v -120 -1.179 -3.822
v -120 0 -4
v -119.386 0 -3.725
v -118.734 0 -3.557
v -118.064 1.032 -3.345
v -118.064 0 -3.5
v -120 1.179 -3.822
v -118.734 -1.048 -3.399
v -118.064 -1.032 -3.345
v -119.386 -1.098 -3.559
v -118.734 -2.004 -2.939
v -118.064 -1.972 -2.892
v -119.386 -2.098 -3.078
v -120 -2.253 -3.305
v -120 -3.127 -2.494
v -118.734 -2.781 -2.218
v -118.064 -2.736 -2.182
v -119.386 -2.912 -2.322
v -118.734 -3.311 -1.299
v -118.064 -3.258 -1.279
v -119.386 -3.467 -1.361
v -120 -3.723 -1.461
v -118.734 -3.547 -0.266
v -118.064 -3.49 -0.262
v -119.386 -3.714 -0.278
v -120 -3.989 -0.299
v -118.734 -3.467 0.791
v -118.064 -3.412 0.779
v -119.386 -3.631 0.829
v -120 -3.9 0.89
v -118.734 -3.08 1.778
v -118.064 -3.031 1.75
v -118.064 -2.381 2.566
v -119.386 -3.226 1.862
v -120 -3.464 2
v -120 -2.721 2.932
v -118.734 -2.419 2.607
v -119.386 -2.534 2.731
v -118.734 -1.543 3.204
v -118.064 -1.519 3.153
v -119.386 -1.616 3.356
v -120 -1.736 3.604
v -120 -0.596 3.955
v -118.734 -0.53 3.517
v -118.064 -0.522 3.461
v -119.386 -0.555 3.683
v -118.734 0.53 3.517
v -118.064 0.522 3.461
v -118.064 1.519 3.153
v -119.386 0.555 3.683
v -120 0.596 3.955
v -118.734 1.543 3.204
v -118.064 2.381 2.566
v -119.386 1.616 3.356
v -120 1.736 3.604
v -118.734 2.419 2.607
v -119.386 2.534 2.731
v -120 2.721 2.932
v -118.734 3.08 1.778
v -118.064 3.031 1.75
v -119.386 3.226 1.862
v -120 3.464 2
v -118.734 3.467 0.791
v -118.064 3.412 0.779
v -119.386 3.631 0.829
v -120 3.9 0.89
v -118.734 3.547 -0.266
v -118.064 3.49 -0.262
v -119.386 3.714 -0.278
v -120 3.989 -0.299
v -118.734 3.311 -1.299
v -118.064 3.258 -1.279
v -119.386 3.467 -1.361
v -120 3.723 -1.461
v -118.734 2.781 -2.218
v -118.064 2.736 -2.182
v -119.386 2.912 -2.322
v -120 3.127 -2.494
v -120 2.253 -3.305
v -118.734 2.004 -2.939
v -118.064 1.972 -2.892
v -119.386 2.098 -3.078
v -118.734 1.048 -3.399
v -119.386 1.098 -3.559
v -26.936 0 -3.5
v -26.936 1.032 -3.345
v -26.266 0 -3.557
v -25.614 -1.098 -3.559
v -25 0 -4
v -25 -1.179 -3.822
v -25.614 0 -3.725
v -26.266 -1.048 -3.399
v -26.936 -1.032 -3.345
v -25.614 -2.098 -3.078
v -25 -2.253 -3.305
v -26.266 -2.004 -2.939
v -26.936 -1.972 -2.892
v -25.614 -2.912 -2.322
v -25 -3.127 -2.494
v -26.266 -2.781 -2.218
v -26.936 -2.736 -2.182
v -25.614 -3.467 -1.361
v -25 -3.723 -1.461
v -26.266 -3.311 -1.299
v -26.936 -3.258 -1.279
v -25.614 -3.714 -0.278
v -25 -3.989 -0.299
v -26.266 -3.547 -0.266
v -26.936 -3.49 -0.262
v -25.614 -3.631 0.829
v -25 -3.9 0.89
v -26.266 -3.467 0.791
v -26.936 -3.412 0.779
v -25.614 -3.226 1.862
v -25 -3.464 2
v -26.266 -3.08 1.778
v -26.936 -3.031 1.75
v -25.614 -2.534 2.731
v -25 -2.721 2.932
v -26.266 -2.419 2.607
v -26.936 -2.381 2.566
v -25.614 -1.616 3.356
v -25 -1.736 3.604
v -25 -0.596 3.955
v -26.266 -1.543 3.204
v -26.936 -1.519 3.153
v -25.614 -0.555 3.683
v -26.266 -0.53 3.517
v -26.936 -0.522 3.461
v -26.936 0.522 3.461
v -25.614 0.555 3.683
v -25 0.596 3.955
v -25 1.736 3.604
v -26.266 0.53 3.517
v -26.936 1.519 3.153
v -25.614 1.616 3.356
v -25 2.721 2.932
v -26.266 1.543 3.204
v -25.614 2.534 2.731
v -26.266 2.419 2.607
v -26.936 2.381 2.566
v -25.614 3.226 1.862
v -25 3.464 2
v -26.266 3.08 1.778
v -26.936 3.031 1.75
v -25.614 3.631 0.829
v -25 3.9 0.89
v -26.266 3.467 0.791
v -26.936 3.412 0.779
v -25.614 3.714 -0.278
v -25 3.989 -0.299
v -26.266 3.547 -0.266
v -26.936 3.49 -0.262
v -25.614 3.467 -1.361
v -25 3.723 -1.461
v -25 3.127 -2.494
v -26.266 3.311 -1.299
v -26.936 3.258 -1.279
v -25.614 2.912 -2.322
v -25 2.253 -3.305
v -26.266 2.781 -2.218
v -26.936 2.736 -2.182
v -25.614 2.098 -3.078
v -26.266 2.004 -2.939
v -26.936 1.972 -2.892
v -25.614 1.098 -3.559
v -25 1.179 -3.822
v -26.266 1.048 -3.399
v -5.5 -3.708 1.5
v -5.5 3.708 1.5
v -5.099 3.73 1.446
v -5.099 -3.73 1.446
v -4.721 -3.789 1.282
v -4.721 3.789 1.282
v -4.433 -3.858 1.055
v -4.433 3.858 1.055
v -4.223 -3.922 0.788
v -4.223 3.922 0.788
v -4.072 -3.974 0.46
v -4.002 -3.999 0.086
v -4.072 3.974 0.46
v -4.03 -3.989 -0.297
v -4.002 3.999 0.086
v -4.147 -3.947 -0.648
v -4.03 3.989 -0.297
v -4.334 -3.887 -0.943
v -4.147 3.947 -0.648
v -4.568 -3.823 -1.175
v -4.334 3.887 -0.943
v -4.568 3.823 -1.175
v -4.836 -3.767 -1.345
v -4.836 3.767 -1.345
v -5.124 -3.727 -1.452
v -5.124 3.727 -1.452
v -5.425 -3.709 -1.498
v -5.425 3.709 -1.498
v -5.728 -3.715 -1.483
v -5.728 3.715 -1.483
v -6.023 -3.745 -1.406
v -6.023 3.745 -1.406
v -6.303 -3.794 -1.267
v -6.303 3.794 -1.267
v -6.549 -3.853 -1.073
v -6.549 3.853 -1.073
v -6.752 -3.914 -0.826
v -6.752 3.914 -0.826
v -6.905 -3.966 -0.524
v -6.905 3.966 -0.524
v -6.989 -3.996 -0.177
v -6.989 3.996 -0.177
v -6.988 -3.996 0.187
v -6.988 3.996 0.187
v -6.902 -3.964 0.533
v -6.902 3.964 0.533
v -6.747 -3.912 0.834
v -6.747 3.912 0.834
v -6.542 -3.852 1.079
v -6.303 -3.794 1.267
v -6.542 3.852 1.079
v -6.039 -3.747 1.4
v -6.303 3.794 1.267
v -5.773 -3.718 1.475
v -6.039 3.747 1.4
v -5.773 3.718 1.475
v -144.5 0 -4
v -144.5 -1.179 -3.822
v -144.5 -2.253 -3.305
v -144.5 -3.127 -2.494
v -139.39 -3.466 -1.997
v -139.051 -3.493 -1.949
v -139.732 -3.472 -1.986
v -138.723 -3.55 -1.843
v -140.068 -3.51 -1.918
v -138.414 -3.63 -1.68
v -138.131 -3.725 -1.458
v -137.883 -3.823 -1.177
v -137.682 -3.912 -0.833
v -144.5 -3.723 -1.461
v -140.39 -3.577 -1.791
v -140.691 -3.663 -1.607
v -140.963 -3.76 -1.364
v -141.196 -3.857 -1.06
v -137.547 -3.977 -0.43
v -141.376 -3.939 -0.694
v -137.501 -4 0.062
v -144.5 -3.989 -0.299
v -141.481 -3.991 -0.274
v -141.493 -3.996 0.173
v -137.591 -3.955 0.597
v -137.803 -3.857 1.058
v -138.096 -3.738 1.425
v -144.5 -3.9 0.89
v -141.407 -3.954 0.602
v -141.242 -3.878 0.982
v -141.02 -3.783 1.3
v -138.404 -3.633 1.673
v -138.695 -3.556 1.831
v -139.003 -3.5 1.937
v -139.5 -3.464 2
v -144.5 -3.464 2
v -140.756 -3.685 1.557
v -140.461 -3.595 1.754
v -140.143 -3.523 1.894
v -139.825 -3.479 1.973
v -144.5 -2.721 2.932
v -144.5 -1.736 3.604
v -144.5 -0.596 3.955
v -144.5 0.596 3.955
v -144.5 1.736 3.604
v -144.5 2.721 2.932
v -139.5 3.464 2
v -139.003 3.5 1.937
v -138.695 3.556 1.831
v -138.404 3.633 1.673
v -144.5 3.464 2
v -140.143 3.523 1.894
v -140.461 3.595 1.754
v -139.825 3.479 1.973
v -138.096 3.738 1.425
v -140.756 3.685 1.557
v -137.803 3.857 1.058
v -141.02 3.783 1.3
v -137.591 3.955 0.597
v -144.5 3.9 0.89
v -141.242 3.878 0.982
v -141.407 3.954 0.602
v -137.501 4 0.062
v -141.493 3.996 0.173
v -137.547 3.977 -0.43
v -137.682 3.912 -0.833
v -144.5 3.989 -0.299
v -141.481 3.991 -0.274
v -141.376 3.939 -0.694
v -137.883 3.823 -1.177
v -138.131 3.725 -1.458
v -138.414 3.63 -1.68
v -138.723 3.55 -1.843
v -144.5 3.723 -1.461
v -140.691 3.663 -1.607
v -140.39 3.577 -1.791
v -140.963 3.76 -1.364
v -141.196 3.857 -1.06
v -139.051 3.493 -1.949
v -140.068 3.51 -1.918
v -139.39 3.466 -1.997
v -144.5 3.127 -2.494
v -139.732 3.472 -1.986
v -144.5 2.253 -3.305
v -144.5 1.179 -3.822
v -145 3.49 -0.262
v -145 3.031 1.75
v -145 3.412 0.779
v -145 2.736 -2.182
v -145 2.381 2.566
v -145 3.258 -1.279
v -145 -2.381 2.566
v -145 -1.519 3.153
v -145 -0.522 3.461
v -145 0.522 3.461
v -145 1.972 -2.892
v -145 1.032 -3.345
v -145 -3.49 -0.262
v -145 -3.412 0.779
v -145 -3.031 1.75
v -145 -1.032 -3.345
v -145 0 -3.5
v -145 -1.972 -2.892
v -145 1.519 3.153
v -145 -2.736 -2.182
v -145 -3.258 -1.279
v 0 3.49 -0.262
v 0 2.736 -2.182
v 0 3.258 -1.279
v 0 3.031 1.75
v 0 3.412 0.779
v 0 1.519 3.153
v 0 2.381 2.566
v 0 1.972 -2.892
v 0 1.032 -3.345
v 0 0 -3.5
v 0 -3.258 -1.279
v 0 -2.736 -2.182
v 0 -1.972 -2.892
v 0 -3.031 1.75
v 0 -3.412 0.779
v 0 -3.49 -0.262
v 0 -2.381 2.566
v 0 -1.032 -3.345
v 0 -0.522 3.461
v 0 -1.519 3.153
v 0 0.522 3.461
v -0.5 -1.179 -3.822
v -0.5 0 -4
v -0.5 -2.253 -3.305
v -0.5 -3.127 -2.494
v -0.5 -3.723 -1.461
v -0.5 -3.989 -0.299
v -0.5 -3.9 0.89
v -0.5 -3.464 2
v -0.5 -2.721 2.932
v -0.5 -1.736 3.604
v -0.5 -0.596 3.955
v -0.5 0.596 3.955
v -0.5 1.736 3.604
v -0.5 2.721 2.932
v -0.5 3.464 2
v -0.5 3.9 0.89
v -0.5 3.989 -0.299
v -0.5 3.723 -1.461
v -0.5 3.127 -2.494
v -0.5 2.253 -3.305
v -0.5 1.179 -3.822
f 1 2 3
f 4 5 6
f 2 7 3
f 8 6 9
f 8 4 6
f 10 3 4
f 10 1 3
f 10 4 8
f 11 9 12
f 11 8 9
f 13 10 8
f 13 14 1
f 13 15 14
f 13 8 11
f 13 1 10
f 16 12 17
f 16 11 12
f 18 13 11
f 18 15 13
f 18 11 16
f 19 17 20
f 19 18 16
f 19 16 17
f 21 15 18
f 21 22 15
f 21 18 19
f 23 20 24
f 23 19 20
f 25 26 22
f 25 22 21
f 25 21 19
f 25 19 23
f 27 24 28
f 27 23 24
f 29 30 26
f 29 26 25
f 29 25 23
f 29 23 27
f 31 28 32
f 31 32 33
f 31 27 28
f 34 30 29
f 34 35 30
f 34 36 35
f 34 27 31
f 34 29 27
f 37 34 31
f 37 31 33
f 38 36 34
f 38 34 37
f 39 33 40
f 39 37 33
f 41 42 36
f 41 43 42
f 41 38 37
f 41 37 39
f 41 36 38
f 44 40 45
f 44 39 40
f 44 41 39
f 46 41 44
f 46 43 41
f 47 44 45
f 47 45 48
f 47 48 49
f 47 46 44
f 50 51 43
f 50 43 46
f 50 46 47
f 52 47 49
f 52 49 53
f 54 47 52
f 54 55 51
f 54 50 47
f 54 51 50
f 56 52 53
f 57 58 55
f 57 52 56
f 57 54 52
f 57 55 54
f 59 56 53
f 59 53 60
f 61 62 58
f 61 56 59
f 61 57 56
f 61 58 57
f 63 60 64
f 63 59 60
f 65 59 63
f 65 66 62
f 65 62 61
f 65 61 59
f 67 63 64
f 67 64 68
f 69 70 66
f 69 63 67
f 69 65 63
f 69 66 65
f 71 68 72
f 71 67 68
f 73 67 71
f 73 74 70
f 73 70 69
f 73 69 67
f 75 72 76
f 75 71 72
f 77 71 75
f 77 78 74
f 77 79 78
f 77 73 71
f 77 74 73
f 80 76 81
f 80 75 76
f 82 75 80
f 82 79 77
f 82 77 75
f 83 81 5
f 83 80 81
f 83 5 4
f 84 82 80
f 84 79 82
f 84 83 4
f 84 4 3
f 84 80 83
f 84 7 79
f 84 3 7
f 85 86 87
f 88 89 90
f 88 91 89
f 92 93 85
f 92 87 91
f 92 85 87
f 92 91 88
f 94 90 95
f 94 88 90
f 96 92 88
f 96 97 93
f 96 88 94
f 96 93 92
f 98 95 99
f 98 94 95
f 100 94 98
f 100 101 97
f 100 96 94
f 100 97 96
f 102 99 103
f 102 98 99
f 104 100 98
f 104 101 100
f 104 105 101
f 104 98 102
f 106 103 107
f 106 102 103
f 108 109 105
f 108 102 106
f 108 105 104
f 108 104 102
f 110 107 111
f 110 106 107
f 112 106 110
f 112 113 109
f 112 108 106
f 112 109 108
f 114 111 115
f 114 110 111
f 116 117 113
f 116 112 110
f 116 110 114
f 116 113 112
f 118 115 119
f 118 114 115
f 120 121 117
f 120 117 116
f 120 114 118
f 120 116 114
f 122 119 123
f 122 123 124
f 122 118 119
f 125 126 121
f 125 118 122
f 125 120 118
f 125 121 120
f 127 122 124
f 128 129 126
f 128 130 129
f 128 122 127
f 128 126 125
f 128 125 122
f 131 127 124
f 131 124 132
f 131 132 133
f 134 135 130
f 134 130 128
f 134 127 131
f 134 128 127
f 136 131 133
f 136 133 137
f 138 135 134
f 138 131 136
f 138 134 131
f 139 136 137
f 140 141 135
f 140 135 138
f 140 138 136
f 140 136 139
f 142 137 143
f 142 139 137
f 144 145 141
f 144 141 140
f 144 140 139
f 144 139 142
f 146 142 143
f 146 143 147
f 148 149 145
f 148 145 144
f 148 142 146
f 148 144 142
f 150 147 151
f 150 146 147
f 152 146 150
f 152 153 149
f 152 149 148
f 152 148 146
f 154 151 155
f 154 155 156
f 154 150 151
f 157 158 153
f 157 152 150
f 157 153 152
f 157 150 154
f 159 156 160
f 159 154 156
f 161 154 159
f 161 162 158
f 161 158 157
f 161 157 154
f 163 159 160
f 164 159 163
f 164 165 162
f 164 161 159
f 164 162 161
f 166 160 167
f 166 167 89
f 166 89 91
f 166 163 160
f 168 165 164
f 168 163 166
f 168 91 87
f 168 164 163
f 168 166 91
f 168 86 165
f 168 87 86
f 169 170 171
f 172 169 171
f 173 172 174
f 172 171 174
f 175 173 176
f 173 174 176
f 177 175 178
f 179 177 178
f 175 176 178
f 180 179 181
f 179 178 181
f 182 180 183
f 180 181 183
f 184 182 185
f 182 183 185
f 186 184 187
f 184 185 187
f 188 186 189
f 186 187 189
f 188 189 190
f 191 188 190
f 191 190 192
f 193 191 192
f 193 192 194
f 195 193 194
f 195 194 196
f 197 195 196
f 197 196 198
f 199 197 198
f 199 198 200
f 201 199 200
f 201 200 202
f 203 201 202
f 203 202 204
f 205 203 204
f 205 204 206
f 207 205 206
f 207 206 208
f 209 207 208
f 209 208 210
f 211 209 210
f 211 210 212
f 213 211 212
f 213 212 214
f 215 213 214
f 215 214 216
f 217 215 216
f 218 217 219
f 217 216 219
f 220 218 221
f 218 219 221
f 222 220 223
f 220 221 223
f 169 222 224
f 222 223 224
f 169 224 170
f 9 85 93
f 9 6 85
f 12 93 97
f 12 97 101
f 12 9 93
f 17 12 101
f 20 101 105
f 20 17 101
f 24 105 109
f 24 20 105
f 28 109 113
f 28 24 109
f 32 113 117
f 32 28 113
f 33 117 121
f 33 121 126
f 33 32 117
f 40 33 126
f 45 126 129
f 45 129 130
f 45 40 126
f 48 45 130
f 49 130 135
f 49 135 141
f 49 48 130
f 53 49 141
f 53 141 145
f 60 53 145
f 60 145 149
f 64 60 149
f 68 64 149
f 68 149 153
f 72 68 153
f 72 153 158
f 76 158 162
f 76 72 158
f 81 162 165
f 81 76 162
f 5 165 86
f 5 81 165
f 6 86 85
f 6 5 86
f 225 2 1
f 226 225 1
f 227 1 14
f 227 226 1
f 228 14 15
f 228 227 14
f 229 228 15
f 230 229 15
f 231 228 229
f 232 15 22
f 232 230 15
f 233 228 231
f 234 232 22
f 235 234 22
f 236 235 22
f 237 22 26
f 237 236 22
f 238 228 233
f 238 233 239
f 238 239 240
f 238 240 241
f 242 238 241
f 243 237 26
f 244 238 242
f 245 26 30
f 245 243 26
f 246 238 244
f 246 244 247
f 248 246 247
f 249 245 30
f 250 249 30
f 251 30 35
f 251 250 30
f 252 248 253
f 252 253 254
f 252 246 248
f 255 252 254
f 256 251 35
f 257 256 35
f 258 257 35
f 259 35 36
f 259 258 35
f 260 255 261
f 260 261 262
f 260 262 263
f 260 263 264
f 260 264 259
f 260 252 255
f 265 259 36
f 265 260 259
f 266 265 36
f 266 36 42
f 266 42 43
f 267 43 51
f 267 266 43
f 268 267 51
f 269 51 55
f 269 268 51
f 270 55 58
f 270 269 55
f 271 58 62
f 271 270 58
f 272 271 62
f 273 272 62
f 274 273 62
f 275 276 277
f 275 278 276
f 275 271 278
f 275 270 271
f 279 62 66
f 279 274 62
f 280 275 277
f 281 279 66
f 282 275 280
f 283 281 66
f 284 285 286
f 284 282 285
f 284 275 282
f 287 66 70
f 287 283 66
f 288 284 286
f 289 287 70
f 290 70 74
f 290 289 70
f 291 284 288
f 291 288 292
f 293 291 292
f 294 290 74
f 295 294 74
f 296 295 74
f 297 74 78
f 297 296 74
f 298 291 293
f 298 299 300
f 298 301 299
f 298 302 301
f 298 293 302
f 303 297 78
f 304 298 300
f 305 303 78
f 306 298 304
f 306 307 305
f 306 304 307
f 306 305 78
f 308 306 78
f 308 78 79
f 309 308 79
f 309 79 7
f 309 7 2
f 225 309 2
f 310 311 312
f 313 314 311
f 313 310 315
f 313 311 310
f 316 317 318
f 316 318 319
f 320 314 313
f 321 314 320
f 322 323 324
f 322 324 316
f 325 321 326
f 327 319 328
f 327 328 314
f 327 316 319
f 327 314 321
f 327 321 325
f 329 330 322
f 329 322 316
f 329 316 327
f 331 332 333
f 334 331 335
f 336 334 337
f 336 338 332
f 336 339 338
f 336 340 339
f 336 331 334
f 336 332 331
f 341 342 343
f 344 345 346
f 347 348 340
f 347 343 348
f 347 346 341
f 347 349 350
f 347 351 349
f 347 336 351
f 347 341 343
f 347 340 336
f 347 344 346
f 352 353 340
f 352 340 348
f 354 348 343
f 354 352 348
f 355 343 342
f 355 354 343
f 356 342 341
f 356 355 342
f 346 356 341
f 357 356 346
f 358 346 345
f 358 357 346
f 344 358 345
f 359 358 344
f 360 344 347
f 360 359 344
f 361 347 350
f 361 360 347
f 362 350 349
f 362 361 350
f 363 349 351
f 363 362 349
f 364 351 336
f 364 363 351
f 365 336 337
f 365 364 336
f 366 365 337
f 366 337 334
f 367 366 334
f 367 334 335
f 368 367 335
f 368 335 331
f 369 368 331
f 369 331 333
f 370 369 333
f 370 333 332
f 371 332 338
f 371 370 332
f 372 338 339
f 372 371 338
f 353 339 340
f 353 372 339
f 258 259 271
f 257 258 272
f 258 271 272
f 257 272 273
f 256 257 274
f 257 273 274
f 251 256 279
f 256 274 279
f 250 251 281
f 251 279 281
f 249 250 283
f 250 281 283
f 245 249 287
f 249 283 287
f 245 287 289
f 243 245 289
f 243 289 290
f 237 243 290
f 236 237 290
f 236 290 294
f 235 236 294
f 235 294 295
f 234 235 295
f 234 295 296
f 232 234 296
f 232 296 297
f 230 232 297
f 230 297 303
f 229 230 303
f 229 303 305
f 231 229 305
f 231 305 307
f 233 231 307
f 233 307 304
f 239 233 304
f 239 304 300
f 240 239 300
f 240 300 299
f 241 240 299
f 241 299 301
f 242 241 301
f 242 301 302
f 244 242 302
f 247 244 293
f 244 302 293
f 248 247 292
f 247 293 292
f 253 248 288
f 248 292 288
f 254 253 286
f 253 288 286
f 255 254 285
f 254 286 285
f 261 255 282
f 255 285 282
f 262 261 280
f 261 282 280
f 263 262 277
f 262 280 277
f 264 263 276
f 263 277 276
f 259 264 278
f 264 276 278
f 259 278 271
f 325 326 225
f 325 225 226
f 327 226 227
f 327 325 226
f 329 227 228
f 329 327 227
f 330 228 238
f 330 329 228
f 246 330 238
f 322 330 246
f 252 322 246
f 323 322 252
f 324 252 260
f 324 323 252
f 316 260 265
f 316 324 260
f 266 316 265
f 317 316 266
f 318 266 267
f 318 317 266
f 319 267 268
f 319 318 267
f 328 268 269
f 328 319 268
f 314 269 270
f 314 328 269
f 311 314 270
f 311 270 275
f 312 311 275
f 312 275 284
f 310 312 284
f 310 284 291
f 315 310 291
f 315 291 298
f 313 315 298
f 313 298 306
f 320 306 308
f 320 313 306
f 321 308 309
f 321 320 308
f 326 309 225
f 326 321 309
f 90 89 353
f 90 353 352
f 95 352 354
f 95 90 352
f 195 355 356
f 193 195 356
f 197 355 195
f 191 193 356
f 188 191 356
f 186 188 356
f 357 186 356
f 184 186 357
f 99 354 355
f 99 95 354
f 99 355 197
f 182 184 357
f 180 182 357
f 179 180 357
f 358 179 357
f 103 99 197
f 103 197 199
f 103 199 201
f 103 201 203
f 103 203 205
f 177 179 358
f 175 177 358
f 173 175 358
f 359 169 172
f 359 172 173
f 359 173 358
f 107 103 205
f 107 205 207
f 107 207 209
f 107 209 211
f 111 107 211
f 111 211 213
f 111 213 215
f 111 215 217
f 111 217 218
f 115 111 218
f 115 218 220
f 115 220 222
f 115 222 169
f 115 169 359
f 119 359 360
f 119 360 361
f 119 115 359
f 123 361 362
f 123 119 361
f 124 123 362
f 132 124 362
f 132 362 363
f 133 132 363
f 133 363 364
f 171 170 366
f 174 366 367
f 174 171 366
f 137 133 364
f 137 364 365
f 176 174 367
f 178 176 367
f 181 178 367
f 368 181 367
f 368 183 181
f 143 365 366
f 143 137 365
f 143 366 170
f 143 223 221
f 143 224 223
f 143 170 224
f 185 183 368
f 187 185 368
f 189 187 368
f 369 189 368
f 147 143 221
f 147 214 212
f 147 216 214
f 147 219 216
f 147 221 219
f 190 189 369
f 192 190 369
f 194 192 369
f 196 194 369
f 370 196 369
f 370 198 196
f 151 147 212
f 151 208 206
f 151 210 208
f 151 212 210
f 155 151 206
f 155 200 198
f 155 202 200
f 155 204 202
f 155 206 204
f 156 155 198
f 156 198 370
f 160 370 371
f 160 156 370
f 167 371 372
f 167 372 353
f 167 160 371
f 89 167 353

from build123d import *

# Parameters (mm, degrees)
ESQUISSE3_R             = 1.5
ESQUISSE3_R_2           = 2
ENL_V_MAT_EXTRU_2_DEPTH = 146.729200917
CHANFREIN1_SIZE         = 0.5


with BuildPart() as part:
    # Esquisse1 → Base-Révolution (revolve)
    with BuildSketch(Plane.XY, mode=Mode.PRIVATE) as base_r_volution_sk:
        with BuildLine():
            Line((0, 0), (0, 4))
            Line((0, 4), (-25, 4))
            ThreePointArc((-25, 4), (-25.936491673, 3.627016654), (-26.936491673, 3.5))
            Line((-26.936491673, 3.5), (-118.063508327, 3.5))
            ThreePointArc((-118.063508327, 3.5), (-119.063508327, 3.627016654), (-120, 4))
            Line((-120, 4), (-145, 4))
            Line((-145, 4), (-145, 0))
            Line((-145, 0), (0, 0))
        make_face()
    revolve(base_r_volution_sk.sketch.rotate(Axis((36, 0, 0), (-1, 0, 0)), 90), axis=Axis((36, 0, 0), (-1, 0, 0)))

    # Esquisse3 → Enlèv. mat.-Extru.2 (cut, through all)
    with BuildSketch(Plane(origin=(0, 10, 0), x_dir=(-1, 0, 0), z_dir=(0, 1, 0))):
        with Locations(Location((5.5, 0, 0), (0, 0, 90))):
            Circle(ESQUISSE3_R)
        with Locations(Location((139.5, 0, 0), (0, 0, 90))):
            Circle(ESQUISSE3_R_2)
    extrude(amount=-ENL_V_MAT_EXTRU_2_DEPTH, mode=Mode.SUBTRACT)

    # Chanfrein1
    chanfrein1_edges = [part.edges().sort_by_distance(p)[0] for p in [
        (0, 0, 4),
        (-145, 0, 4),
    ]]
    chamfer(chanfrein1_edges, length=CHANFREIN1_SIZE)


solid = part.part
